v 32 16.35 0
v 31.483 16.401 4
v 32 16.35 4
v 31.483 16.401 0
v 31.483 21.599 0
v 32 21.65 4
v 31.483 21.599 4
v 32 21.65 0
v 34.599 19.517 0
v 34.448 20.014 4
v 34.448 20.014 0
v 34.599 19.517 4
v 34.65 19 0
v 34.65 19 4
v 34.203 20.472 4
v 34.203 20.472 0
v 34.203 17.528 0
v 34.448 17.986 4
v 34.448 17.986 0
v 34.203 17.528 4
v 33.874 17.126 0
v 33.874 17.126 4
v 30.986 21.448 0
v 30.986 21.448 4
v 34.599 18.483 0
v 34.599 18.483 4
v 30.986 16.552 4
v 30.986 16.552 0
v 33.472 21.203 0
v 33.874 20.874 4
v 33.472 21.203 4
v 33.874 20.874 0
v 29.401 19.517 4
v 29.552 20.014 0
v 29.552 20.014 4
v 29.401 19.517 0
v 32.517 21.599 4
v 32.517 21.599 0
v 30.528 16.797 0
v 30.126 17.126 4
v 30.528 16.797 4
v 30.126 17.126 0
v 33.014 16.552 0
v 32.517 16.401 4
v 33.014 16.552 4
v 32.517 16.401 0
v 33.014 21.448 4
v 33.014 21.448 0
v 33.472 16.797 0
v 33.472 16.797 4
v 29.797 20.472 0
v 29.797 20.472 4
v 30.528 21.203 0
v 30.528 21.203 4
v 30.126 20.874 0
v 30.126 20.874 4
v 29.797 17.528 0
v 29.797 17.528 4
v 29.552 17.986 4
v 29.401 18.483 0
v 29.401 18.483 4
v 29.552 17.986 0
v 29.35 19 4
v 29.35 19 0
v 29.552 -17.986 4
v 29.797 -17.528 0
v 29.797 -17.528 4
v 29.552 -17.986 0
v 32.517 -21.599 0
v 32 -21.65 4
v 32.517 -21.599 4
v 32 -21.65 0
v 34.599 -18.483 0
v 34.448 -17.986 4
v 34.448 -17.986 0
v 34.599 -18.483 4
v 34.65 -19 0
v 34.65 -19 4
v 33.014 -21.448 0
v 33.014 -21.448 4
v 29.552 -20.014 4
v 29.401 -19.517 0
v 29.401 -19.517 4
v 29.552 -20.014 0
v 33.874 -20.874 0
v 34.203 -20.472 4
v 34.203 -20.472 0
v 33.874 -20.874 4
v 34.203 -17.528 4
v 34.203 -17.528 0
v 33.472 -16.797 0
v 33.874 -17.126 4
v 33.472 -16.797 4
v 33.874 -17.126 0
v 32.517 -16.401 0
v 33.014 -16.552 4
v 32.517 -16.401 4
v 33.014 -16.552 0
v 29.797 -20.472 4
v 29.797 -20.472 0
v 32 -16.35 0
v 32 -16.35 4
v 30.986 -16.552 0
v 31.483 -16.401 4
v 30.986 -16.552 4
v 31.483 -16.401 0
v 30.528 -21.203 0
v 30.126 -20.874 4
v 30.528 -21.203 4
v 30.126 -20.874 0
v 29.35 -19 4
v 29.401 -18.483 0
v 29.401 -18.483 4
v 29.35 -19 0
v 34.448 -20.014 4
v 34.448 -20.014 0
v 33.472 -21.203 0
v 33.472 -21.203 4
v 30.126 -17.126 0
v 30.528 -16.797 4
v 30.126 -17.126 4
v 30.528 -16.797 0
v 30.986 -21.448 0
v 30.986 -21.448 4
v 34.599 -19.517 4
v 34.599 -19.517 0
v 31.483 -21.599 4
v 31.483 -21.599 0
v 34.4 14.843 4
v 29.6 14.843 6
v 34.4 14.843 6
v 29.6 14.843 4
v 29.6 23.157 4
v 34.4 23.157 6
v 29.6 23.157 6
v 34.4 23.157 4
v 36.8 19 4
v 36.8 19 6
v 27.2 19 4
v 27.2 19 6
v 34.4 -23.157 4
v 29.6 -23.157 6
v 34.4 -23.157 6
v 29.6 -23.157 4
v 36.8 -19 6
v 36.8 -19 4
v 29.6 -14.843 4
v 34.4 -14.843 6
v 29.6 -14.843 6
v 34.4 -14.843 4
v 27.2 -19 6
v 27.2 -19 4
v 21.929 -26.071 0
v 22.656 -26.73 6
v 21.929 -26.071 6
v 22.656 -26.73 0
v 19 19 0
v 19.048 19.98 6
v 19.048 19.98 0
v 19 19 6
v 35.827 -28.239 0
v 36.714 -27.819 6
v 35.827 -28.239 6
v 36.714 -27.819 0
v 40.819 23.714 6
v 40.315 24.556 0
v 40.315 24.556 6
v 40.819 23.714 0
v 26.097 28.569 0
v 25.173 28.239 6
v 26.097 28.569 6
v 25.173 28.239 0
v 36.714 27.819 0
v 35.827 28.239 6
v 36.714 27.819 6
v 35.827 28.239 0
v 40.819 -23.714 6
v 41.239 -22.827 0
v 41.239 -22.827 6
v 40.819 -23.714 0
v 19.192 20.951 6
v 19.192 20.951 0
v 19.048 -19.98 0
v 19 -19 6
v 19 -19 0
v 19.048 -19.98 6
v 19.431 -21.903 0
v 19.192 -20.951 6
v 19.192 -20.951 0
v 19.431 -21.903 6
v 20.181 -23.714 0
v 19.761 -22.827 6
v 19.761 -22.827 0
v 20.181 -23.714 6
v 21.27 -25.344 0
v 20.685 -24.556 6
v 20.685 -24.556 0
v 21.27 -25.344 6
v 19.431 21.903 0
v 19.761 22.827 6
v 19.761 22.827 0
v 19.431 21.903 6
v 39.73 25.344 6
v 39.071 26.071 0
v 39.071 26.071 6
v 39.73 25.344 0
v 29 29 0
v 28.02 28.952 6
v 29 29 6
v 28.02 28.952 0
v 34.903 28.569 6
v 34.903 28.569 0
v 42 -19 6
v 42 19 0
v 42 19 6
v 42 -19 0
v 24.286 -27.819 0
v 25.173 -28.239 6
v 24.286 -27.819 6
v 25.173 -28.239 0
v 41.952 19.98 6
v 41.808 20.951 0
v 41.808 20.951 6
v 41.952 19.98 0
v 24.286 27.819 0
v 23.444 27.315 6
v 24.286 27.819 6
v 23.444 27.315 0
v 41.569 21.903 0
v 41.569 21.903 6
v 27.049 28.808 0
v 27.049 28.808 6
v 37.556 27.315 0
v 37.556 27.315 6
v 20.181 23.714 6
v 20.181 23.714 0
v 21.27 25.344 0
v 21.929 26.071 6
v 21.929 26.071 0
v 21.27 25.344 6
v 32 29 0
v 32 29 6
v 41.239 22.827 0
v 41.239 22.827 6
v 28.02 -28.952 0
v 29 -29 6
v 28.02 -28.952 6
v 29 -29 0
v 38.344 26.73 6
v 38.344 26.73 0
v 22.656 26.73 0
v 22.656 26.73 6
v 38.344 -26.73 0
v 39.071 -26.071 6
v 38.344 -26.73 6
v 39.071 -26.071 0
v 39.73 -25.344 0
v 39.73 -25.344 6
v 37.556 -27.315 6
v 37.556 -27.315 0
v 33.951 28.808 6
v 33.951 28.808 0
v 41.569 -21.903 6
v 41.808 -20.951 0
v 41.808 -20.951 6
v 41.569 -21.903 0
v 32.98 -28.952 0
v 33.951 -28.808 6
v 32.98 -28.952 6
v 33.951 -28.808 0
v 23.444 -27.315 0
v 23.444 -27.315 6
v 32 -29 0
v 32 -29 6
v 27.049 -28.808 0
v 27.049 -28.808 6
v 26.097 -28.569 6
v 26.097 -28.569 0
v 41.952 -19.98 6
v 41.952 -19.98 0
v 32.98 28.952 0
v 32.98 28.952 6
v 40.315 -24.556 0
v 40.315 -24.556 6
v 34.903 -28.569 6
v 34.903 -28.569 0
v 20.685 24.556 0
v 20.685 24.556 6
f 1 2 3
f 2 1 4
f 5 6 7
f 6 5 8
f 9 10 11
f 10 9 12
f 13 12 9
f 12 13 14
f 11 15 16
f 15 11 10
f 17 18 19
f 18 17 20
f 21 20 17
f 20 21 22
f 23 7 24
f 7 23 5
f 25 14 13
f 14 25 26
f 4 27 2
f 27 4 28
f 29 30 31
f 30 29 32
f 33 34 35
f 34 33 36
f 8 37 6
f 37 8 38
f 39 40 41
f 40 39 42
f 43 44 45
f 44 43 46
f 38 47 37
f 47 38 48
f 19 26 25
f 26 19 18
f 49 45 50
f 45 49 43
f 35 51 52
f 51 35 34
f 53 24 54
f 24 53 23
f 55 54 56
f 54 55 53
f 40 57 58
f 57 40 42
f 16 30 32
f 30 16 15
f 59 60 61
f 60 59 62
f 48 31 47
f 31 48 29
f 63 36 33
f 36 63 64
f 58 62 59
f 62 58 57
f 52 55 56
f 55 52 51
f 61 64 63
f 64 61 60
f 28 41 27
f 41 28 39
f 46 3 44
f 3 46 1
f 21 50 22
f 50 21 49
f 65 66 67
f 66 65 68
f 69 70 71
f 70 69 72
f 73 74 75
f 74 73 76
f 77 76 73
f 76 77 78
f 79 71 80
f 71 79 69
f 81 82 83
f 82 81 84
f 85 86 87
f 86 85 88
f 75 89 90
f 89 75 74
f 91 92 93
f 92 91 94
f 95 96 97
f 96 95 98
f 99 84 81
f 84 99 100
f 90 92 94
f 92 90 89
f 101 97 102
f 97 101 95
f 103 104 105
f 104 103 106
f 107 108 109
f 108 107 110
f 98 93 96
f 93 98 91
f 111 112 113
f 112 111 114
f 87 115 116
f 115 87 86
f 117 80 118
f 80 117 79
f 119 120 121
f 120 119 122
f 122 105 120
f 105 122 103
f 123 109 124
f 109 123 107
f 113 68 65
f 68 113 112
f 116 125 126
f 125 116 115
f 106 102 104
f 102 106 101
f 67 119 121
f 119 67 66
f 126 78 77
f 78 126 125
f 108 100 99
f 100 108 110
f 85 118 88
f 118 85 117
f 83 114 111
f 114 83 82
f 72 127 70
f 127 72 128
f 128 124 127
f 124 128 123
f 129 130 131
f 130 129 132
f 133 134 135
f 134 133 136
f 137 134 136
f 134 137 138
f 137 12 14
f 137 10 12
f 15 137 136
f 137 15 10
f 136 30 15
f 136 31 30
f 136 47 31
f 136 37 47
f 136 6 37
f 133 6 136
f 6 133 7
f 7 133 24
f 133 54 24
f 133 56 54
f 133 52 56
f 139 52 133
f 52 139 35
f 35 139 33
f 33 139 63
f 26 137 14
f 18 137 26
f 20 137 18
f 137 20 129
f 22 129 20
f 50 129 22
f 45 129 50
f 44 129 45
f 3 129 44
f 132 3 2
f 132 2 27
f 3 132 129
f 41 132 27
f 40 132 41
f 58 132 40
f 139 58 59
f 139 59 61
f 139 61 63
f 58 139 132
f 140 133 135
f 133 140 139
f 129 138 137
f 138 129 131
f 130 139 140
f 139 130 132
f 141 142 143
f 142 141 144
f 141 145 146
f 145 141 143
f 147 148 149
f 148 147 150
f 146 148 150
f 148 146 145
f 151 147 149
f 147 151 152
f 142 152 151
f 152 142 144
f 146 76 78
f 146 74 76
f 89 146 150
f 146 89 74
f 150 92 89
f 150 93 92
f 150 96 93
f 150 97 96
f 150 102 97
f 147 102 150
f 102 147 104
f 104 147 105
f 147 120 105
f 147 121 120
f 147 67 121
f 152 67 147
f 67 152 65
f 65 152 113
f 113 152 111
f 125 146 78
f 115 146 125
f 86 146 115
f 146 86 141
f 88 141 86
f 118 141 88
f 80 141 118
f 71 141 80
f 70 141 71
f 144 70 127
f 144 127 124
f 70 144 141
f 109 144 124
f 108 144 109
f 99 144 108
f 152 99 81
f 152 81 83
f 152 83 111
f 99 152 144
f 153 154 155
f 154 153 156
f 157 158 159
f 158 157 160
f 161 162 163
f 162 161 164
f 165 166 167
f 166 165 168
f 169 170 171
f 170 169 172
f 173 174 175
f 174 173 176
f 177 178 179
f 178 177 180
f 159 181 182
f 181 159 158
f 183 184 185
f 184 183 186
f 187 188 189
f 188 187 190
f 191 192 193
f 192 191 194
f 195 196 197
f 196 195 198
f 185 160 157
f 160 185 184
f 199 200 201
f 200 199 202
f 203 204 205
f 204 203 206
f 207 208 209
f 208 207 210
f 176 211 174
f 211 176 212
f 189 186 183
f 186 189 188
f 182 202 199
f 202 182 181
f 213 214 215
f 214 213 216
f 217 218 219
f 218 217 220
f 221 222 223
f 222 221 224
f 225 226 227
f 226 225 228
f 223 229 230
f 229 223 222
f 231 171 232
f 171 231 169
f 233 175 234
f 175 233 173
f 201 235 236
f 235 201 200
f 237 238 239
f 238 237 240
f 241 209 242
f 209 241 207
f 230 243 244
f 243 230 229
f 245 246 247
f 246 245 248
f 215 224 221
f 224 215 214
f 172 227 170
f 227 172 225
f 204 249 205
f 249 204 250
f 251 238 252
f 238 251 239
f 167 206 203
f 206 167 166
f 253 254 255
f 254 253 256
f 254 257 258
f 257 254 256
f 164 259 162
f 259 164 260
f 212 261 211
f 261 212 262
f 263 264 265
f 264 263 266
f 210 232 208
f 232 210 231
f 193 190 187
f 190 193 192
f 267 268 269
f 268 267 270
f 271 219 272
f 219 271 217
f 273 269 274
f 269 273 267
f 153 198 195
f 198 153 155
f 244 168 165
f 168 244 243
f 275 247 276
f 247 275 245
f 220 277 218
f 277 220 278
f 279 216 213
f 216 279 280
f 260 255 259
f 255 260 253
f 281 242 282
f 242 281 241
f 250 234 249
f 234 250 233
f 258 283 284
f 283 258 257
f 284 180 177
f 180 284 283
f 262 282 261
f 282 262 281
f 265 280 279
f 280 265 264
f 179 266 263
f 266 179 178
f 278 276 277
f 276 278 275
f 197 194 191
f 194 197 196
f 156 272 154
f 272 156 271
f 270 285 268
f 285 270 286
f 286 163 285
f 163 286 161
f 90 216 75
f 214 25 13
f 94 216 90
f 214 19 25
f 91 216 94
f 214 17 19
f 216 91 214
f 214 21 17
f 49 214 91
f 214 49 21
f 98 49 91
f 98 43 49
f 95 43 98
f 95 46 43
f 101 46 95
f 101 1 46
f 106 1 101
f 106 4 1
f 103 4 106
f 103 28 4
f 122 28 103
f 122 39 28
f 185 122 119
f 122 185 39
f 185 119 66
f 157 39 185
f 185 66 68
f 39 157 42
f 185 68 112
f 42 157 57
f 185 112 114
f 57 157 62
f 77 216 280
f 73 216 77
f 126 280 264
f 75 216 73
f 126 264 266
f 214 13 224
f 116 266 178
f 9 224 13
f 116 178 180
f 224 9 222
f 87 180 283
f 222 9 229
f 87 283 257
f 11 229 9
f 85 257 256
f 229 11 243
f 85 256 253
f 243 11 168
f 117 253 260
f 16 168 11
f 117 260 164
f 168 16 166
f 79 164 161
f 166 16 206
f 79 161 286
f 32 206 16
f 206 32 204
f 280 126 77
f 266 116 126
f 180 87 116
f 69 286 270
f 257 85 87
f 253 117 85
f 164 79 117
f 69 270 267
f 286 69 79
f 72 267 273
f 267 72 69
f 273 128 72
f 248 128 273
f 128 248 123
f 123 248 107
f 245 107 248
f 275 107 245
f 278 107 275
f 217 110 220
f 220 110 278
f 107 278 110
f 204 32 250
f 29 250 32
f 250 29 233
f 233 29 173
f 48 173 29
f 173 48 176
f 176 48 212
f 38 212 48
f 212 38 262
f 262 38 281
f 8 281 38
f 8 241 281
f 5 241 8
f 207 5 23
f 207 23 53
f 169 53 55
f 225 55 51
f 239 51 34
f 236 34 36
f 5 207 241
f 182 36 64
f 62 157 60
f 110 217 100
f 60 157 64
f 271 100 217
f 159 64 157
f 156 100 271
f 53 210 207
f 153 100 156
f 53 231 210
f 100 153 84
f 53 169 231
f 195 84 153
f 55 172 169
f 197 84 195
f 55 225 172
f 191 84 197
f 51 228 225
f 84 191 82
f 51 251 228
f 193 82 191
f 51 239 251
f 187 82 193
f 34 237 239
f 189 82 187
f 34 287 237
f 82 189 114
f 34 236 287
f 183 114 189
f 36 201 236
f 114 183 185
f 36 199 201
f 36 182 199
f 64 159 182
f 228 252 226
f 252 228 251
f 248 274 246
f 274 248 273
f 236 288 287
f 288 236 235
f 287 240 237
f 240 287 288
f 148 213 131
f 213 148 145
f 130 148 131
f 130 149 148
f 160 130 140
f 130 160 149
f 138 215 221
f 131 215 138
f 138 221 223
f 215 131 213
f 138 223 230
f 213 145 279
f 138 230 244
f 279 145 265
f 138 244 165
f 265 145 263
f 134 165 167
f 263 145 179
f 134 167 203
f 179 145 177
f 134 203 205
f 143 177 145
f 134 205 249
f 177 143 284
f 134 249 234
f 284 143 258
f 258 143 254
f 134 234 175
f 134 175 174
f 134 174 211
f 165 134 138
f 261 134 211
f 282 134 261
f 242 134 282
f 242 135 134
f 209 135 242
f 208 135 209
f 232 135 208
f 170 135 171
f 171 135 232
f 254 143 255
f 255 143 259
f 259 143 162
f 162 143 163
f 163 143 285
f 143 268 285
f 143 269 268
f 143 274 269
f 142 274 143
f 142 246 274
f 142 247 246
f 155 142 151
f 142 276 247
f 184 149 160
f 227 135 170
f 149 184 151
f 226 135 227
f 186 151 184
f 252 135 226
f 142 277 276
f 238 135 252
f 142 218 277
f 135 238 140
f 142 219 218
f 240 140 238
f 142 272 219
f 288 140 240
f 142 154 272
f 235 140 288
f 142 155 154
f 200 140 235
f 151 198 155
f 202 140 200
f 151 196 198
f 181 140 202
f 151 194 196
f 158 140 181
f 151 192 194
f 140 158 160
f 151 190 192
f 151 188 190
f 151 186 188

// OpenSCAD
% translate([0, 0, -7]) color("grey") {
    translate([32, 19, 0]) magnet(); 
    translate([32, -19, 0]) magnet(); 
    translate([-32, 19, 0]) magnet(); 
    translate([-32, -19, 0]) magnet(); 
}

// baseplate();

wing_right();

module wing_right() {
    height = 6;
    
    x = 32;
    y = 19;
    
    difference() {
        hull() {
            translate([32, 19, 0]) cylinder($fn=64, h=height, d=20); 
            translate([32, -19, 0]) cylinder($fn=64, h=height, d=20);  
            
            translate([32-3, 19, 0]) cylinder($fn=64, h=height, d=20); 
            translate([32-3, -19, 0]) cylinder($fn=64, h=height, d=20);  
        }
    
        // magnet screws
        translate([0, 0, -1]) {
            translate([x, y, 0]) cylinder($fn=32, d=5.3, h=height+2);
            translate([x, -y, 0]) cylinder($fn=32, d=5.3, h=height+2);
        }
        translate([0, 0, 4]) {
            translate([x, y, 0]) cylinder($fn=6, d=9.6, h=height+2);
            translate([x, -y, 0]) cylinder($fn=6, d=9.6, h=height+2);
        }

    }
}

module baseplate() {
    height = 6;

    x = 27.8;
    y = 16;
    y2 = 32;
        
    y_head = 0;

    difference() {
        union() {
            translate([x, -y, 0]) cylinder($fn=64, d=20, h=height);
            translate([-x, -y, 0]) cylinder($fn=64, d=20, h=height);
            translate([0, y2, 0]) cylinder($fn=64, d=20, h=height);
            
            translate([x, -y, height]) cylinder($fn=64, d1=20, d2=20-2, h=2);
            translate([-x, -y, height]) cylinder($fn=64, d1=20, d2=20-2, h=2);
            translate([0, y2, height]) cylinder($fn=64, d1=20, d2=20-2, h=2);
            
            hull() {
                translate([x, -y, 0]) cylinder($fn=32, d=20-8, h=height-1);
                translate([-x, -y, 0]) cylinder($fn=32, d=20-8, h=height-1);
                translate([0, y2, 0]) cylinder($fn=32, d=20-8, h=height-1);
            }
            hull() {
                translate([x, -y, height-1]) cylinder($fn=32, d1=20-8, d2=20-9, h=1);
                translate([-x, -y, height-1]) cylinder($fn=32, d1=20-8, d2=20-9, h=1);
                translate([0, y2, height-1]) cylinder($fn=32, d1=20-8, d2=20-9, h=1);
            }
            
            hull() {
                translate([x, -y, height]) cylinder($fn=32, d1=6, d2=3, h=2);
                translate([0, 0, height]) cylinder($fn=32, d1=6, d2=3, h=2);
            }
            hull() {   
                translate([-x, -y, height]) cylinder($fn=32, d1=6, d2=3, h=2);
                translate([0, 0, height]) cylinder($fn=32, d1=6, d2=3, h=2);
            }
            hull() {  
                translate([0, y2, height]) cylinder($fn=32, d1=6, d2=3, h=2);
                translate([0, 0, height]) cylinder($fn=32, d1=6, d2=3, h=2);
            }
            
            // ballhead
            translate([0, y_head, 0]) cylinder($fn=64, d=29+6, h=height+3);
            translate([0, y_head, height+3]) cylinder($fn=64, d1=29+6, d2=29+6-2, h=1);
            
            // grappling hook
            translate([0, -20, 1]) hull() {
                translate([-11, 0, 0]) cylinder($fn=32, d=10, h=height-2);
                translate([+11, 0, 0]) cylinder($fn=32, d=10, h=height-2);
            }
            translate([0, -20, height-1]) hull() {
                translate([-11, 0, 0]) cylinder($fn=32, d1=10, d2=8, h=1);
                translate([+11, 0, 0]) cylinder($fn=32, d1=10, d2=8, h=1);
            }
            translate([0, -20, 0]) hull() {
                translate([-11, 0, 0]) cylinder($fn=32, d1=8, d2=10, h=1);
                translate([+11, 0, 0]) cylinder($fn=32, d1=8, d2=10, h=1);
            }
        }
        
        // ballhead screw hole, 1/4 inch
        translate([0, y_head, -1]) cylinder($fn=32, h=height+10, d=6.4+0.3); 
        translate([0, y_head, -1]) cylinder($fn=32, h=3, d=9.5+0.1);
        
        // ballhead hole
        translate([0, y_head, height]) cylinder($fn=64, d=29+0.3, h=height+2);
        
        // grappling hook
        translate([0, -20, -1]) hull() {
            translate([-9, 0, 0]) cylinder($fn=32, d=3, h=height+2);
            translate([+9, 0, 0]) cylinder($fn=32, d=3, h=height+2);
        }
        translate([0, -20, -1]) hull() {
            translate([-9, 0, height]) cylinder($fn=32, d1=3, d2=5, h=1.1);
            translate([+9, 0, height]) cylinder($fn=32, d1=3, d2=5, h=1.1);
        }
        translate([0, -20, -.1]) hull() {
            translate([-9, 0, 0]) cylinder($fn=32, d1=5, d2=3, h=1.1);
            translate([+9, 0, 0]) cylinder($fn=32, d1=5, d2=3, h=1.1);
        }
        
        // magnet screws
        translate([0, 0, -1]) {
            translate([x, -y, 0]) cylinder($fn=32, d=5.3, h=height+2);
            translate([-x, -y, 0]) cylinder($fn=32, d=5.3, h=height+2);
            translate([0, y2, 0]) cylinder($fn=32, d=5.3, h=height+2);
        }
        translate([0, 0, 4]) {
            translate([x, -y, 0]) cylinder($fn=6, d=9.6, h=height+2);
            translate([-x, -y, 0]) cylinder($fn=6, d=9.6, h=height+2);
            translate([0, y2, 0]) cylinder($fn=6, d=9.6, h=height+2);
        }
    }
    
    // ballhead screw support
    translate([0, y_head, 2]) cylinder(d=10, h=0.3);
}

module magnet() {
    difference() {
        union() {
            translate([]) cylinder($fn=32, h=5, d=36);
            translate([0, 0, 5]) cylinder($fn=32, h=2, d1=36, d2=36-2);
        }
        
        translate([0, 0, -1]) cylinder($fn=32, d=5, h=10);
    }
}
